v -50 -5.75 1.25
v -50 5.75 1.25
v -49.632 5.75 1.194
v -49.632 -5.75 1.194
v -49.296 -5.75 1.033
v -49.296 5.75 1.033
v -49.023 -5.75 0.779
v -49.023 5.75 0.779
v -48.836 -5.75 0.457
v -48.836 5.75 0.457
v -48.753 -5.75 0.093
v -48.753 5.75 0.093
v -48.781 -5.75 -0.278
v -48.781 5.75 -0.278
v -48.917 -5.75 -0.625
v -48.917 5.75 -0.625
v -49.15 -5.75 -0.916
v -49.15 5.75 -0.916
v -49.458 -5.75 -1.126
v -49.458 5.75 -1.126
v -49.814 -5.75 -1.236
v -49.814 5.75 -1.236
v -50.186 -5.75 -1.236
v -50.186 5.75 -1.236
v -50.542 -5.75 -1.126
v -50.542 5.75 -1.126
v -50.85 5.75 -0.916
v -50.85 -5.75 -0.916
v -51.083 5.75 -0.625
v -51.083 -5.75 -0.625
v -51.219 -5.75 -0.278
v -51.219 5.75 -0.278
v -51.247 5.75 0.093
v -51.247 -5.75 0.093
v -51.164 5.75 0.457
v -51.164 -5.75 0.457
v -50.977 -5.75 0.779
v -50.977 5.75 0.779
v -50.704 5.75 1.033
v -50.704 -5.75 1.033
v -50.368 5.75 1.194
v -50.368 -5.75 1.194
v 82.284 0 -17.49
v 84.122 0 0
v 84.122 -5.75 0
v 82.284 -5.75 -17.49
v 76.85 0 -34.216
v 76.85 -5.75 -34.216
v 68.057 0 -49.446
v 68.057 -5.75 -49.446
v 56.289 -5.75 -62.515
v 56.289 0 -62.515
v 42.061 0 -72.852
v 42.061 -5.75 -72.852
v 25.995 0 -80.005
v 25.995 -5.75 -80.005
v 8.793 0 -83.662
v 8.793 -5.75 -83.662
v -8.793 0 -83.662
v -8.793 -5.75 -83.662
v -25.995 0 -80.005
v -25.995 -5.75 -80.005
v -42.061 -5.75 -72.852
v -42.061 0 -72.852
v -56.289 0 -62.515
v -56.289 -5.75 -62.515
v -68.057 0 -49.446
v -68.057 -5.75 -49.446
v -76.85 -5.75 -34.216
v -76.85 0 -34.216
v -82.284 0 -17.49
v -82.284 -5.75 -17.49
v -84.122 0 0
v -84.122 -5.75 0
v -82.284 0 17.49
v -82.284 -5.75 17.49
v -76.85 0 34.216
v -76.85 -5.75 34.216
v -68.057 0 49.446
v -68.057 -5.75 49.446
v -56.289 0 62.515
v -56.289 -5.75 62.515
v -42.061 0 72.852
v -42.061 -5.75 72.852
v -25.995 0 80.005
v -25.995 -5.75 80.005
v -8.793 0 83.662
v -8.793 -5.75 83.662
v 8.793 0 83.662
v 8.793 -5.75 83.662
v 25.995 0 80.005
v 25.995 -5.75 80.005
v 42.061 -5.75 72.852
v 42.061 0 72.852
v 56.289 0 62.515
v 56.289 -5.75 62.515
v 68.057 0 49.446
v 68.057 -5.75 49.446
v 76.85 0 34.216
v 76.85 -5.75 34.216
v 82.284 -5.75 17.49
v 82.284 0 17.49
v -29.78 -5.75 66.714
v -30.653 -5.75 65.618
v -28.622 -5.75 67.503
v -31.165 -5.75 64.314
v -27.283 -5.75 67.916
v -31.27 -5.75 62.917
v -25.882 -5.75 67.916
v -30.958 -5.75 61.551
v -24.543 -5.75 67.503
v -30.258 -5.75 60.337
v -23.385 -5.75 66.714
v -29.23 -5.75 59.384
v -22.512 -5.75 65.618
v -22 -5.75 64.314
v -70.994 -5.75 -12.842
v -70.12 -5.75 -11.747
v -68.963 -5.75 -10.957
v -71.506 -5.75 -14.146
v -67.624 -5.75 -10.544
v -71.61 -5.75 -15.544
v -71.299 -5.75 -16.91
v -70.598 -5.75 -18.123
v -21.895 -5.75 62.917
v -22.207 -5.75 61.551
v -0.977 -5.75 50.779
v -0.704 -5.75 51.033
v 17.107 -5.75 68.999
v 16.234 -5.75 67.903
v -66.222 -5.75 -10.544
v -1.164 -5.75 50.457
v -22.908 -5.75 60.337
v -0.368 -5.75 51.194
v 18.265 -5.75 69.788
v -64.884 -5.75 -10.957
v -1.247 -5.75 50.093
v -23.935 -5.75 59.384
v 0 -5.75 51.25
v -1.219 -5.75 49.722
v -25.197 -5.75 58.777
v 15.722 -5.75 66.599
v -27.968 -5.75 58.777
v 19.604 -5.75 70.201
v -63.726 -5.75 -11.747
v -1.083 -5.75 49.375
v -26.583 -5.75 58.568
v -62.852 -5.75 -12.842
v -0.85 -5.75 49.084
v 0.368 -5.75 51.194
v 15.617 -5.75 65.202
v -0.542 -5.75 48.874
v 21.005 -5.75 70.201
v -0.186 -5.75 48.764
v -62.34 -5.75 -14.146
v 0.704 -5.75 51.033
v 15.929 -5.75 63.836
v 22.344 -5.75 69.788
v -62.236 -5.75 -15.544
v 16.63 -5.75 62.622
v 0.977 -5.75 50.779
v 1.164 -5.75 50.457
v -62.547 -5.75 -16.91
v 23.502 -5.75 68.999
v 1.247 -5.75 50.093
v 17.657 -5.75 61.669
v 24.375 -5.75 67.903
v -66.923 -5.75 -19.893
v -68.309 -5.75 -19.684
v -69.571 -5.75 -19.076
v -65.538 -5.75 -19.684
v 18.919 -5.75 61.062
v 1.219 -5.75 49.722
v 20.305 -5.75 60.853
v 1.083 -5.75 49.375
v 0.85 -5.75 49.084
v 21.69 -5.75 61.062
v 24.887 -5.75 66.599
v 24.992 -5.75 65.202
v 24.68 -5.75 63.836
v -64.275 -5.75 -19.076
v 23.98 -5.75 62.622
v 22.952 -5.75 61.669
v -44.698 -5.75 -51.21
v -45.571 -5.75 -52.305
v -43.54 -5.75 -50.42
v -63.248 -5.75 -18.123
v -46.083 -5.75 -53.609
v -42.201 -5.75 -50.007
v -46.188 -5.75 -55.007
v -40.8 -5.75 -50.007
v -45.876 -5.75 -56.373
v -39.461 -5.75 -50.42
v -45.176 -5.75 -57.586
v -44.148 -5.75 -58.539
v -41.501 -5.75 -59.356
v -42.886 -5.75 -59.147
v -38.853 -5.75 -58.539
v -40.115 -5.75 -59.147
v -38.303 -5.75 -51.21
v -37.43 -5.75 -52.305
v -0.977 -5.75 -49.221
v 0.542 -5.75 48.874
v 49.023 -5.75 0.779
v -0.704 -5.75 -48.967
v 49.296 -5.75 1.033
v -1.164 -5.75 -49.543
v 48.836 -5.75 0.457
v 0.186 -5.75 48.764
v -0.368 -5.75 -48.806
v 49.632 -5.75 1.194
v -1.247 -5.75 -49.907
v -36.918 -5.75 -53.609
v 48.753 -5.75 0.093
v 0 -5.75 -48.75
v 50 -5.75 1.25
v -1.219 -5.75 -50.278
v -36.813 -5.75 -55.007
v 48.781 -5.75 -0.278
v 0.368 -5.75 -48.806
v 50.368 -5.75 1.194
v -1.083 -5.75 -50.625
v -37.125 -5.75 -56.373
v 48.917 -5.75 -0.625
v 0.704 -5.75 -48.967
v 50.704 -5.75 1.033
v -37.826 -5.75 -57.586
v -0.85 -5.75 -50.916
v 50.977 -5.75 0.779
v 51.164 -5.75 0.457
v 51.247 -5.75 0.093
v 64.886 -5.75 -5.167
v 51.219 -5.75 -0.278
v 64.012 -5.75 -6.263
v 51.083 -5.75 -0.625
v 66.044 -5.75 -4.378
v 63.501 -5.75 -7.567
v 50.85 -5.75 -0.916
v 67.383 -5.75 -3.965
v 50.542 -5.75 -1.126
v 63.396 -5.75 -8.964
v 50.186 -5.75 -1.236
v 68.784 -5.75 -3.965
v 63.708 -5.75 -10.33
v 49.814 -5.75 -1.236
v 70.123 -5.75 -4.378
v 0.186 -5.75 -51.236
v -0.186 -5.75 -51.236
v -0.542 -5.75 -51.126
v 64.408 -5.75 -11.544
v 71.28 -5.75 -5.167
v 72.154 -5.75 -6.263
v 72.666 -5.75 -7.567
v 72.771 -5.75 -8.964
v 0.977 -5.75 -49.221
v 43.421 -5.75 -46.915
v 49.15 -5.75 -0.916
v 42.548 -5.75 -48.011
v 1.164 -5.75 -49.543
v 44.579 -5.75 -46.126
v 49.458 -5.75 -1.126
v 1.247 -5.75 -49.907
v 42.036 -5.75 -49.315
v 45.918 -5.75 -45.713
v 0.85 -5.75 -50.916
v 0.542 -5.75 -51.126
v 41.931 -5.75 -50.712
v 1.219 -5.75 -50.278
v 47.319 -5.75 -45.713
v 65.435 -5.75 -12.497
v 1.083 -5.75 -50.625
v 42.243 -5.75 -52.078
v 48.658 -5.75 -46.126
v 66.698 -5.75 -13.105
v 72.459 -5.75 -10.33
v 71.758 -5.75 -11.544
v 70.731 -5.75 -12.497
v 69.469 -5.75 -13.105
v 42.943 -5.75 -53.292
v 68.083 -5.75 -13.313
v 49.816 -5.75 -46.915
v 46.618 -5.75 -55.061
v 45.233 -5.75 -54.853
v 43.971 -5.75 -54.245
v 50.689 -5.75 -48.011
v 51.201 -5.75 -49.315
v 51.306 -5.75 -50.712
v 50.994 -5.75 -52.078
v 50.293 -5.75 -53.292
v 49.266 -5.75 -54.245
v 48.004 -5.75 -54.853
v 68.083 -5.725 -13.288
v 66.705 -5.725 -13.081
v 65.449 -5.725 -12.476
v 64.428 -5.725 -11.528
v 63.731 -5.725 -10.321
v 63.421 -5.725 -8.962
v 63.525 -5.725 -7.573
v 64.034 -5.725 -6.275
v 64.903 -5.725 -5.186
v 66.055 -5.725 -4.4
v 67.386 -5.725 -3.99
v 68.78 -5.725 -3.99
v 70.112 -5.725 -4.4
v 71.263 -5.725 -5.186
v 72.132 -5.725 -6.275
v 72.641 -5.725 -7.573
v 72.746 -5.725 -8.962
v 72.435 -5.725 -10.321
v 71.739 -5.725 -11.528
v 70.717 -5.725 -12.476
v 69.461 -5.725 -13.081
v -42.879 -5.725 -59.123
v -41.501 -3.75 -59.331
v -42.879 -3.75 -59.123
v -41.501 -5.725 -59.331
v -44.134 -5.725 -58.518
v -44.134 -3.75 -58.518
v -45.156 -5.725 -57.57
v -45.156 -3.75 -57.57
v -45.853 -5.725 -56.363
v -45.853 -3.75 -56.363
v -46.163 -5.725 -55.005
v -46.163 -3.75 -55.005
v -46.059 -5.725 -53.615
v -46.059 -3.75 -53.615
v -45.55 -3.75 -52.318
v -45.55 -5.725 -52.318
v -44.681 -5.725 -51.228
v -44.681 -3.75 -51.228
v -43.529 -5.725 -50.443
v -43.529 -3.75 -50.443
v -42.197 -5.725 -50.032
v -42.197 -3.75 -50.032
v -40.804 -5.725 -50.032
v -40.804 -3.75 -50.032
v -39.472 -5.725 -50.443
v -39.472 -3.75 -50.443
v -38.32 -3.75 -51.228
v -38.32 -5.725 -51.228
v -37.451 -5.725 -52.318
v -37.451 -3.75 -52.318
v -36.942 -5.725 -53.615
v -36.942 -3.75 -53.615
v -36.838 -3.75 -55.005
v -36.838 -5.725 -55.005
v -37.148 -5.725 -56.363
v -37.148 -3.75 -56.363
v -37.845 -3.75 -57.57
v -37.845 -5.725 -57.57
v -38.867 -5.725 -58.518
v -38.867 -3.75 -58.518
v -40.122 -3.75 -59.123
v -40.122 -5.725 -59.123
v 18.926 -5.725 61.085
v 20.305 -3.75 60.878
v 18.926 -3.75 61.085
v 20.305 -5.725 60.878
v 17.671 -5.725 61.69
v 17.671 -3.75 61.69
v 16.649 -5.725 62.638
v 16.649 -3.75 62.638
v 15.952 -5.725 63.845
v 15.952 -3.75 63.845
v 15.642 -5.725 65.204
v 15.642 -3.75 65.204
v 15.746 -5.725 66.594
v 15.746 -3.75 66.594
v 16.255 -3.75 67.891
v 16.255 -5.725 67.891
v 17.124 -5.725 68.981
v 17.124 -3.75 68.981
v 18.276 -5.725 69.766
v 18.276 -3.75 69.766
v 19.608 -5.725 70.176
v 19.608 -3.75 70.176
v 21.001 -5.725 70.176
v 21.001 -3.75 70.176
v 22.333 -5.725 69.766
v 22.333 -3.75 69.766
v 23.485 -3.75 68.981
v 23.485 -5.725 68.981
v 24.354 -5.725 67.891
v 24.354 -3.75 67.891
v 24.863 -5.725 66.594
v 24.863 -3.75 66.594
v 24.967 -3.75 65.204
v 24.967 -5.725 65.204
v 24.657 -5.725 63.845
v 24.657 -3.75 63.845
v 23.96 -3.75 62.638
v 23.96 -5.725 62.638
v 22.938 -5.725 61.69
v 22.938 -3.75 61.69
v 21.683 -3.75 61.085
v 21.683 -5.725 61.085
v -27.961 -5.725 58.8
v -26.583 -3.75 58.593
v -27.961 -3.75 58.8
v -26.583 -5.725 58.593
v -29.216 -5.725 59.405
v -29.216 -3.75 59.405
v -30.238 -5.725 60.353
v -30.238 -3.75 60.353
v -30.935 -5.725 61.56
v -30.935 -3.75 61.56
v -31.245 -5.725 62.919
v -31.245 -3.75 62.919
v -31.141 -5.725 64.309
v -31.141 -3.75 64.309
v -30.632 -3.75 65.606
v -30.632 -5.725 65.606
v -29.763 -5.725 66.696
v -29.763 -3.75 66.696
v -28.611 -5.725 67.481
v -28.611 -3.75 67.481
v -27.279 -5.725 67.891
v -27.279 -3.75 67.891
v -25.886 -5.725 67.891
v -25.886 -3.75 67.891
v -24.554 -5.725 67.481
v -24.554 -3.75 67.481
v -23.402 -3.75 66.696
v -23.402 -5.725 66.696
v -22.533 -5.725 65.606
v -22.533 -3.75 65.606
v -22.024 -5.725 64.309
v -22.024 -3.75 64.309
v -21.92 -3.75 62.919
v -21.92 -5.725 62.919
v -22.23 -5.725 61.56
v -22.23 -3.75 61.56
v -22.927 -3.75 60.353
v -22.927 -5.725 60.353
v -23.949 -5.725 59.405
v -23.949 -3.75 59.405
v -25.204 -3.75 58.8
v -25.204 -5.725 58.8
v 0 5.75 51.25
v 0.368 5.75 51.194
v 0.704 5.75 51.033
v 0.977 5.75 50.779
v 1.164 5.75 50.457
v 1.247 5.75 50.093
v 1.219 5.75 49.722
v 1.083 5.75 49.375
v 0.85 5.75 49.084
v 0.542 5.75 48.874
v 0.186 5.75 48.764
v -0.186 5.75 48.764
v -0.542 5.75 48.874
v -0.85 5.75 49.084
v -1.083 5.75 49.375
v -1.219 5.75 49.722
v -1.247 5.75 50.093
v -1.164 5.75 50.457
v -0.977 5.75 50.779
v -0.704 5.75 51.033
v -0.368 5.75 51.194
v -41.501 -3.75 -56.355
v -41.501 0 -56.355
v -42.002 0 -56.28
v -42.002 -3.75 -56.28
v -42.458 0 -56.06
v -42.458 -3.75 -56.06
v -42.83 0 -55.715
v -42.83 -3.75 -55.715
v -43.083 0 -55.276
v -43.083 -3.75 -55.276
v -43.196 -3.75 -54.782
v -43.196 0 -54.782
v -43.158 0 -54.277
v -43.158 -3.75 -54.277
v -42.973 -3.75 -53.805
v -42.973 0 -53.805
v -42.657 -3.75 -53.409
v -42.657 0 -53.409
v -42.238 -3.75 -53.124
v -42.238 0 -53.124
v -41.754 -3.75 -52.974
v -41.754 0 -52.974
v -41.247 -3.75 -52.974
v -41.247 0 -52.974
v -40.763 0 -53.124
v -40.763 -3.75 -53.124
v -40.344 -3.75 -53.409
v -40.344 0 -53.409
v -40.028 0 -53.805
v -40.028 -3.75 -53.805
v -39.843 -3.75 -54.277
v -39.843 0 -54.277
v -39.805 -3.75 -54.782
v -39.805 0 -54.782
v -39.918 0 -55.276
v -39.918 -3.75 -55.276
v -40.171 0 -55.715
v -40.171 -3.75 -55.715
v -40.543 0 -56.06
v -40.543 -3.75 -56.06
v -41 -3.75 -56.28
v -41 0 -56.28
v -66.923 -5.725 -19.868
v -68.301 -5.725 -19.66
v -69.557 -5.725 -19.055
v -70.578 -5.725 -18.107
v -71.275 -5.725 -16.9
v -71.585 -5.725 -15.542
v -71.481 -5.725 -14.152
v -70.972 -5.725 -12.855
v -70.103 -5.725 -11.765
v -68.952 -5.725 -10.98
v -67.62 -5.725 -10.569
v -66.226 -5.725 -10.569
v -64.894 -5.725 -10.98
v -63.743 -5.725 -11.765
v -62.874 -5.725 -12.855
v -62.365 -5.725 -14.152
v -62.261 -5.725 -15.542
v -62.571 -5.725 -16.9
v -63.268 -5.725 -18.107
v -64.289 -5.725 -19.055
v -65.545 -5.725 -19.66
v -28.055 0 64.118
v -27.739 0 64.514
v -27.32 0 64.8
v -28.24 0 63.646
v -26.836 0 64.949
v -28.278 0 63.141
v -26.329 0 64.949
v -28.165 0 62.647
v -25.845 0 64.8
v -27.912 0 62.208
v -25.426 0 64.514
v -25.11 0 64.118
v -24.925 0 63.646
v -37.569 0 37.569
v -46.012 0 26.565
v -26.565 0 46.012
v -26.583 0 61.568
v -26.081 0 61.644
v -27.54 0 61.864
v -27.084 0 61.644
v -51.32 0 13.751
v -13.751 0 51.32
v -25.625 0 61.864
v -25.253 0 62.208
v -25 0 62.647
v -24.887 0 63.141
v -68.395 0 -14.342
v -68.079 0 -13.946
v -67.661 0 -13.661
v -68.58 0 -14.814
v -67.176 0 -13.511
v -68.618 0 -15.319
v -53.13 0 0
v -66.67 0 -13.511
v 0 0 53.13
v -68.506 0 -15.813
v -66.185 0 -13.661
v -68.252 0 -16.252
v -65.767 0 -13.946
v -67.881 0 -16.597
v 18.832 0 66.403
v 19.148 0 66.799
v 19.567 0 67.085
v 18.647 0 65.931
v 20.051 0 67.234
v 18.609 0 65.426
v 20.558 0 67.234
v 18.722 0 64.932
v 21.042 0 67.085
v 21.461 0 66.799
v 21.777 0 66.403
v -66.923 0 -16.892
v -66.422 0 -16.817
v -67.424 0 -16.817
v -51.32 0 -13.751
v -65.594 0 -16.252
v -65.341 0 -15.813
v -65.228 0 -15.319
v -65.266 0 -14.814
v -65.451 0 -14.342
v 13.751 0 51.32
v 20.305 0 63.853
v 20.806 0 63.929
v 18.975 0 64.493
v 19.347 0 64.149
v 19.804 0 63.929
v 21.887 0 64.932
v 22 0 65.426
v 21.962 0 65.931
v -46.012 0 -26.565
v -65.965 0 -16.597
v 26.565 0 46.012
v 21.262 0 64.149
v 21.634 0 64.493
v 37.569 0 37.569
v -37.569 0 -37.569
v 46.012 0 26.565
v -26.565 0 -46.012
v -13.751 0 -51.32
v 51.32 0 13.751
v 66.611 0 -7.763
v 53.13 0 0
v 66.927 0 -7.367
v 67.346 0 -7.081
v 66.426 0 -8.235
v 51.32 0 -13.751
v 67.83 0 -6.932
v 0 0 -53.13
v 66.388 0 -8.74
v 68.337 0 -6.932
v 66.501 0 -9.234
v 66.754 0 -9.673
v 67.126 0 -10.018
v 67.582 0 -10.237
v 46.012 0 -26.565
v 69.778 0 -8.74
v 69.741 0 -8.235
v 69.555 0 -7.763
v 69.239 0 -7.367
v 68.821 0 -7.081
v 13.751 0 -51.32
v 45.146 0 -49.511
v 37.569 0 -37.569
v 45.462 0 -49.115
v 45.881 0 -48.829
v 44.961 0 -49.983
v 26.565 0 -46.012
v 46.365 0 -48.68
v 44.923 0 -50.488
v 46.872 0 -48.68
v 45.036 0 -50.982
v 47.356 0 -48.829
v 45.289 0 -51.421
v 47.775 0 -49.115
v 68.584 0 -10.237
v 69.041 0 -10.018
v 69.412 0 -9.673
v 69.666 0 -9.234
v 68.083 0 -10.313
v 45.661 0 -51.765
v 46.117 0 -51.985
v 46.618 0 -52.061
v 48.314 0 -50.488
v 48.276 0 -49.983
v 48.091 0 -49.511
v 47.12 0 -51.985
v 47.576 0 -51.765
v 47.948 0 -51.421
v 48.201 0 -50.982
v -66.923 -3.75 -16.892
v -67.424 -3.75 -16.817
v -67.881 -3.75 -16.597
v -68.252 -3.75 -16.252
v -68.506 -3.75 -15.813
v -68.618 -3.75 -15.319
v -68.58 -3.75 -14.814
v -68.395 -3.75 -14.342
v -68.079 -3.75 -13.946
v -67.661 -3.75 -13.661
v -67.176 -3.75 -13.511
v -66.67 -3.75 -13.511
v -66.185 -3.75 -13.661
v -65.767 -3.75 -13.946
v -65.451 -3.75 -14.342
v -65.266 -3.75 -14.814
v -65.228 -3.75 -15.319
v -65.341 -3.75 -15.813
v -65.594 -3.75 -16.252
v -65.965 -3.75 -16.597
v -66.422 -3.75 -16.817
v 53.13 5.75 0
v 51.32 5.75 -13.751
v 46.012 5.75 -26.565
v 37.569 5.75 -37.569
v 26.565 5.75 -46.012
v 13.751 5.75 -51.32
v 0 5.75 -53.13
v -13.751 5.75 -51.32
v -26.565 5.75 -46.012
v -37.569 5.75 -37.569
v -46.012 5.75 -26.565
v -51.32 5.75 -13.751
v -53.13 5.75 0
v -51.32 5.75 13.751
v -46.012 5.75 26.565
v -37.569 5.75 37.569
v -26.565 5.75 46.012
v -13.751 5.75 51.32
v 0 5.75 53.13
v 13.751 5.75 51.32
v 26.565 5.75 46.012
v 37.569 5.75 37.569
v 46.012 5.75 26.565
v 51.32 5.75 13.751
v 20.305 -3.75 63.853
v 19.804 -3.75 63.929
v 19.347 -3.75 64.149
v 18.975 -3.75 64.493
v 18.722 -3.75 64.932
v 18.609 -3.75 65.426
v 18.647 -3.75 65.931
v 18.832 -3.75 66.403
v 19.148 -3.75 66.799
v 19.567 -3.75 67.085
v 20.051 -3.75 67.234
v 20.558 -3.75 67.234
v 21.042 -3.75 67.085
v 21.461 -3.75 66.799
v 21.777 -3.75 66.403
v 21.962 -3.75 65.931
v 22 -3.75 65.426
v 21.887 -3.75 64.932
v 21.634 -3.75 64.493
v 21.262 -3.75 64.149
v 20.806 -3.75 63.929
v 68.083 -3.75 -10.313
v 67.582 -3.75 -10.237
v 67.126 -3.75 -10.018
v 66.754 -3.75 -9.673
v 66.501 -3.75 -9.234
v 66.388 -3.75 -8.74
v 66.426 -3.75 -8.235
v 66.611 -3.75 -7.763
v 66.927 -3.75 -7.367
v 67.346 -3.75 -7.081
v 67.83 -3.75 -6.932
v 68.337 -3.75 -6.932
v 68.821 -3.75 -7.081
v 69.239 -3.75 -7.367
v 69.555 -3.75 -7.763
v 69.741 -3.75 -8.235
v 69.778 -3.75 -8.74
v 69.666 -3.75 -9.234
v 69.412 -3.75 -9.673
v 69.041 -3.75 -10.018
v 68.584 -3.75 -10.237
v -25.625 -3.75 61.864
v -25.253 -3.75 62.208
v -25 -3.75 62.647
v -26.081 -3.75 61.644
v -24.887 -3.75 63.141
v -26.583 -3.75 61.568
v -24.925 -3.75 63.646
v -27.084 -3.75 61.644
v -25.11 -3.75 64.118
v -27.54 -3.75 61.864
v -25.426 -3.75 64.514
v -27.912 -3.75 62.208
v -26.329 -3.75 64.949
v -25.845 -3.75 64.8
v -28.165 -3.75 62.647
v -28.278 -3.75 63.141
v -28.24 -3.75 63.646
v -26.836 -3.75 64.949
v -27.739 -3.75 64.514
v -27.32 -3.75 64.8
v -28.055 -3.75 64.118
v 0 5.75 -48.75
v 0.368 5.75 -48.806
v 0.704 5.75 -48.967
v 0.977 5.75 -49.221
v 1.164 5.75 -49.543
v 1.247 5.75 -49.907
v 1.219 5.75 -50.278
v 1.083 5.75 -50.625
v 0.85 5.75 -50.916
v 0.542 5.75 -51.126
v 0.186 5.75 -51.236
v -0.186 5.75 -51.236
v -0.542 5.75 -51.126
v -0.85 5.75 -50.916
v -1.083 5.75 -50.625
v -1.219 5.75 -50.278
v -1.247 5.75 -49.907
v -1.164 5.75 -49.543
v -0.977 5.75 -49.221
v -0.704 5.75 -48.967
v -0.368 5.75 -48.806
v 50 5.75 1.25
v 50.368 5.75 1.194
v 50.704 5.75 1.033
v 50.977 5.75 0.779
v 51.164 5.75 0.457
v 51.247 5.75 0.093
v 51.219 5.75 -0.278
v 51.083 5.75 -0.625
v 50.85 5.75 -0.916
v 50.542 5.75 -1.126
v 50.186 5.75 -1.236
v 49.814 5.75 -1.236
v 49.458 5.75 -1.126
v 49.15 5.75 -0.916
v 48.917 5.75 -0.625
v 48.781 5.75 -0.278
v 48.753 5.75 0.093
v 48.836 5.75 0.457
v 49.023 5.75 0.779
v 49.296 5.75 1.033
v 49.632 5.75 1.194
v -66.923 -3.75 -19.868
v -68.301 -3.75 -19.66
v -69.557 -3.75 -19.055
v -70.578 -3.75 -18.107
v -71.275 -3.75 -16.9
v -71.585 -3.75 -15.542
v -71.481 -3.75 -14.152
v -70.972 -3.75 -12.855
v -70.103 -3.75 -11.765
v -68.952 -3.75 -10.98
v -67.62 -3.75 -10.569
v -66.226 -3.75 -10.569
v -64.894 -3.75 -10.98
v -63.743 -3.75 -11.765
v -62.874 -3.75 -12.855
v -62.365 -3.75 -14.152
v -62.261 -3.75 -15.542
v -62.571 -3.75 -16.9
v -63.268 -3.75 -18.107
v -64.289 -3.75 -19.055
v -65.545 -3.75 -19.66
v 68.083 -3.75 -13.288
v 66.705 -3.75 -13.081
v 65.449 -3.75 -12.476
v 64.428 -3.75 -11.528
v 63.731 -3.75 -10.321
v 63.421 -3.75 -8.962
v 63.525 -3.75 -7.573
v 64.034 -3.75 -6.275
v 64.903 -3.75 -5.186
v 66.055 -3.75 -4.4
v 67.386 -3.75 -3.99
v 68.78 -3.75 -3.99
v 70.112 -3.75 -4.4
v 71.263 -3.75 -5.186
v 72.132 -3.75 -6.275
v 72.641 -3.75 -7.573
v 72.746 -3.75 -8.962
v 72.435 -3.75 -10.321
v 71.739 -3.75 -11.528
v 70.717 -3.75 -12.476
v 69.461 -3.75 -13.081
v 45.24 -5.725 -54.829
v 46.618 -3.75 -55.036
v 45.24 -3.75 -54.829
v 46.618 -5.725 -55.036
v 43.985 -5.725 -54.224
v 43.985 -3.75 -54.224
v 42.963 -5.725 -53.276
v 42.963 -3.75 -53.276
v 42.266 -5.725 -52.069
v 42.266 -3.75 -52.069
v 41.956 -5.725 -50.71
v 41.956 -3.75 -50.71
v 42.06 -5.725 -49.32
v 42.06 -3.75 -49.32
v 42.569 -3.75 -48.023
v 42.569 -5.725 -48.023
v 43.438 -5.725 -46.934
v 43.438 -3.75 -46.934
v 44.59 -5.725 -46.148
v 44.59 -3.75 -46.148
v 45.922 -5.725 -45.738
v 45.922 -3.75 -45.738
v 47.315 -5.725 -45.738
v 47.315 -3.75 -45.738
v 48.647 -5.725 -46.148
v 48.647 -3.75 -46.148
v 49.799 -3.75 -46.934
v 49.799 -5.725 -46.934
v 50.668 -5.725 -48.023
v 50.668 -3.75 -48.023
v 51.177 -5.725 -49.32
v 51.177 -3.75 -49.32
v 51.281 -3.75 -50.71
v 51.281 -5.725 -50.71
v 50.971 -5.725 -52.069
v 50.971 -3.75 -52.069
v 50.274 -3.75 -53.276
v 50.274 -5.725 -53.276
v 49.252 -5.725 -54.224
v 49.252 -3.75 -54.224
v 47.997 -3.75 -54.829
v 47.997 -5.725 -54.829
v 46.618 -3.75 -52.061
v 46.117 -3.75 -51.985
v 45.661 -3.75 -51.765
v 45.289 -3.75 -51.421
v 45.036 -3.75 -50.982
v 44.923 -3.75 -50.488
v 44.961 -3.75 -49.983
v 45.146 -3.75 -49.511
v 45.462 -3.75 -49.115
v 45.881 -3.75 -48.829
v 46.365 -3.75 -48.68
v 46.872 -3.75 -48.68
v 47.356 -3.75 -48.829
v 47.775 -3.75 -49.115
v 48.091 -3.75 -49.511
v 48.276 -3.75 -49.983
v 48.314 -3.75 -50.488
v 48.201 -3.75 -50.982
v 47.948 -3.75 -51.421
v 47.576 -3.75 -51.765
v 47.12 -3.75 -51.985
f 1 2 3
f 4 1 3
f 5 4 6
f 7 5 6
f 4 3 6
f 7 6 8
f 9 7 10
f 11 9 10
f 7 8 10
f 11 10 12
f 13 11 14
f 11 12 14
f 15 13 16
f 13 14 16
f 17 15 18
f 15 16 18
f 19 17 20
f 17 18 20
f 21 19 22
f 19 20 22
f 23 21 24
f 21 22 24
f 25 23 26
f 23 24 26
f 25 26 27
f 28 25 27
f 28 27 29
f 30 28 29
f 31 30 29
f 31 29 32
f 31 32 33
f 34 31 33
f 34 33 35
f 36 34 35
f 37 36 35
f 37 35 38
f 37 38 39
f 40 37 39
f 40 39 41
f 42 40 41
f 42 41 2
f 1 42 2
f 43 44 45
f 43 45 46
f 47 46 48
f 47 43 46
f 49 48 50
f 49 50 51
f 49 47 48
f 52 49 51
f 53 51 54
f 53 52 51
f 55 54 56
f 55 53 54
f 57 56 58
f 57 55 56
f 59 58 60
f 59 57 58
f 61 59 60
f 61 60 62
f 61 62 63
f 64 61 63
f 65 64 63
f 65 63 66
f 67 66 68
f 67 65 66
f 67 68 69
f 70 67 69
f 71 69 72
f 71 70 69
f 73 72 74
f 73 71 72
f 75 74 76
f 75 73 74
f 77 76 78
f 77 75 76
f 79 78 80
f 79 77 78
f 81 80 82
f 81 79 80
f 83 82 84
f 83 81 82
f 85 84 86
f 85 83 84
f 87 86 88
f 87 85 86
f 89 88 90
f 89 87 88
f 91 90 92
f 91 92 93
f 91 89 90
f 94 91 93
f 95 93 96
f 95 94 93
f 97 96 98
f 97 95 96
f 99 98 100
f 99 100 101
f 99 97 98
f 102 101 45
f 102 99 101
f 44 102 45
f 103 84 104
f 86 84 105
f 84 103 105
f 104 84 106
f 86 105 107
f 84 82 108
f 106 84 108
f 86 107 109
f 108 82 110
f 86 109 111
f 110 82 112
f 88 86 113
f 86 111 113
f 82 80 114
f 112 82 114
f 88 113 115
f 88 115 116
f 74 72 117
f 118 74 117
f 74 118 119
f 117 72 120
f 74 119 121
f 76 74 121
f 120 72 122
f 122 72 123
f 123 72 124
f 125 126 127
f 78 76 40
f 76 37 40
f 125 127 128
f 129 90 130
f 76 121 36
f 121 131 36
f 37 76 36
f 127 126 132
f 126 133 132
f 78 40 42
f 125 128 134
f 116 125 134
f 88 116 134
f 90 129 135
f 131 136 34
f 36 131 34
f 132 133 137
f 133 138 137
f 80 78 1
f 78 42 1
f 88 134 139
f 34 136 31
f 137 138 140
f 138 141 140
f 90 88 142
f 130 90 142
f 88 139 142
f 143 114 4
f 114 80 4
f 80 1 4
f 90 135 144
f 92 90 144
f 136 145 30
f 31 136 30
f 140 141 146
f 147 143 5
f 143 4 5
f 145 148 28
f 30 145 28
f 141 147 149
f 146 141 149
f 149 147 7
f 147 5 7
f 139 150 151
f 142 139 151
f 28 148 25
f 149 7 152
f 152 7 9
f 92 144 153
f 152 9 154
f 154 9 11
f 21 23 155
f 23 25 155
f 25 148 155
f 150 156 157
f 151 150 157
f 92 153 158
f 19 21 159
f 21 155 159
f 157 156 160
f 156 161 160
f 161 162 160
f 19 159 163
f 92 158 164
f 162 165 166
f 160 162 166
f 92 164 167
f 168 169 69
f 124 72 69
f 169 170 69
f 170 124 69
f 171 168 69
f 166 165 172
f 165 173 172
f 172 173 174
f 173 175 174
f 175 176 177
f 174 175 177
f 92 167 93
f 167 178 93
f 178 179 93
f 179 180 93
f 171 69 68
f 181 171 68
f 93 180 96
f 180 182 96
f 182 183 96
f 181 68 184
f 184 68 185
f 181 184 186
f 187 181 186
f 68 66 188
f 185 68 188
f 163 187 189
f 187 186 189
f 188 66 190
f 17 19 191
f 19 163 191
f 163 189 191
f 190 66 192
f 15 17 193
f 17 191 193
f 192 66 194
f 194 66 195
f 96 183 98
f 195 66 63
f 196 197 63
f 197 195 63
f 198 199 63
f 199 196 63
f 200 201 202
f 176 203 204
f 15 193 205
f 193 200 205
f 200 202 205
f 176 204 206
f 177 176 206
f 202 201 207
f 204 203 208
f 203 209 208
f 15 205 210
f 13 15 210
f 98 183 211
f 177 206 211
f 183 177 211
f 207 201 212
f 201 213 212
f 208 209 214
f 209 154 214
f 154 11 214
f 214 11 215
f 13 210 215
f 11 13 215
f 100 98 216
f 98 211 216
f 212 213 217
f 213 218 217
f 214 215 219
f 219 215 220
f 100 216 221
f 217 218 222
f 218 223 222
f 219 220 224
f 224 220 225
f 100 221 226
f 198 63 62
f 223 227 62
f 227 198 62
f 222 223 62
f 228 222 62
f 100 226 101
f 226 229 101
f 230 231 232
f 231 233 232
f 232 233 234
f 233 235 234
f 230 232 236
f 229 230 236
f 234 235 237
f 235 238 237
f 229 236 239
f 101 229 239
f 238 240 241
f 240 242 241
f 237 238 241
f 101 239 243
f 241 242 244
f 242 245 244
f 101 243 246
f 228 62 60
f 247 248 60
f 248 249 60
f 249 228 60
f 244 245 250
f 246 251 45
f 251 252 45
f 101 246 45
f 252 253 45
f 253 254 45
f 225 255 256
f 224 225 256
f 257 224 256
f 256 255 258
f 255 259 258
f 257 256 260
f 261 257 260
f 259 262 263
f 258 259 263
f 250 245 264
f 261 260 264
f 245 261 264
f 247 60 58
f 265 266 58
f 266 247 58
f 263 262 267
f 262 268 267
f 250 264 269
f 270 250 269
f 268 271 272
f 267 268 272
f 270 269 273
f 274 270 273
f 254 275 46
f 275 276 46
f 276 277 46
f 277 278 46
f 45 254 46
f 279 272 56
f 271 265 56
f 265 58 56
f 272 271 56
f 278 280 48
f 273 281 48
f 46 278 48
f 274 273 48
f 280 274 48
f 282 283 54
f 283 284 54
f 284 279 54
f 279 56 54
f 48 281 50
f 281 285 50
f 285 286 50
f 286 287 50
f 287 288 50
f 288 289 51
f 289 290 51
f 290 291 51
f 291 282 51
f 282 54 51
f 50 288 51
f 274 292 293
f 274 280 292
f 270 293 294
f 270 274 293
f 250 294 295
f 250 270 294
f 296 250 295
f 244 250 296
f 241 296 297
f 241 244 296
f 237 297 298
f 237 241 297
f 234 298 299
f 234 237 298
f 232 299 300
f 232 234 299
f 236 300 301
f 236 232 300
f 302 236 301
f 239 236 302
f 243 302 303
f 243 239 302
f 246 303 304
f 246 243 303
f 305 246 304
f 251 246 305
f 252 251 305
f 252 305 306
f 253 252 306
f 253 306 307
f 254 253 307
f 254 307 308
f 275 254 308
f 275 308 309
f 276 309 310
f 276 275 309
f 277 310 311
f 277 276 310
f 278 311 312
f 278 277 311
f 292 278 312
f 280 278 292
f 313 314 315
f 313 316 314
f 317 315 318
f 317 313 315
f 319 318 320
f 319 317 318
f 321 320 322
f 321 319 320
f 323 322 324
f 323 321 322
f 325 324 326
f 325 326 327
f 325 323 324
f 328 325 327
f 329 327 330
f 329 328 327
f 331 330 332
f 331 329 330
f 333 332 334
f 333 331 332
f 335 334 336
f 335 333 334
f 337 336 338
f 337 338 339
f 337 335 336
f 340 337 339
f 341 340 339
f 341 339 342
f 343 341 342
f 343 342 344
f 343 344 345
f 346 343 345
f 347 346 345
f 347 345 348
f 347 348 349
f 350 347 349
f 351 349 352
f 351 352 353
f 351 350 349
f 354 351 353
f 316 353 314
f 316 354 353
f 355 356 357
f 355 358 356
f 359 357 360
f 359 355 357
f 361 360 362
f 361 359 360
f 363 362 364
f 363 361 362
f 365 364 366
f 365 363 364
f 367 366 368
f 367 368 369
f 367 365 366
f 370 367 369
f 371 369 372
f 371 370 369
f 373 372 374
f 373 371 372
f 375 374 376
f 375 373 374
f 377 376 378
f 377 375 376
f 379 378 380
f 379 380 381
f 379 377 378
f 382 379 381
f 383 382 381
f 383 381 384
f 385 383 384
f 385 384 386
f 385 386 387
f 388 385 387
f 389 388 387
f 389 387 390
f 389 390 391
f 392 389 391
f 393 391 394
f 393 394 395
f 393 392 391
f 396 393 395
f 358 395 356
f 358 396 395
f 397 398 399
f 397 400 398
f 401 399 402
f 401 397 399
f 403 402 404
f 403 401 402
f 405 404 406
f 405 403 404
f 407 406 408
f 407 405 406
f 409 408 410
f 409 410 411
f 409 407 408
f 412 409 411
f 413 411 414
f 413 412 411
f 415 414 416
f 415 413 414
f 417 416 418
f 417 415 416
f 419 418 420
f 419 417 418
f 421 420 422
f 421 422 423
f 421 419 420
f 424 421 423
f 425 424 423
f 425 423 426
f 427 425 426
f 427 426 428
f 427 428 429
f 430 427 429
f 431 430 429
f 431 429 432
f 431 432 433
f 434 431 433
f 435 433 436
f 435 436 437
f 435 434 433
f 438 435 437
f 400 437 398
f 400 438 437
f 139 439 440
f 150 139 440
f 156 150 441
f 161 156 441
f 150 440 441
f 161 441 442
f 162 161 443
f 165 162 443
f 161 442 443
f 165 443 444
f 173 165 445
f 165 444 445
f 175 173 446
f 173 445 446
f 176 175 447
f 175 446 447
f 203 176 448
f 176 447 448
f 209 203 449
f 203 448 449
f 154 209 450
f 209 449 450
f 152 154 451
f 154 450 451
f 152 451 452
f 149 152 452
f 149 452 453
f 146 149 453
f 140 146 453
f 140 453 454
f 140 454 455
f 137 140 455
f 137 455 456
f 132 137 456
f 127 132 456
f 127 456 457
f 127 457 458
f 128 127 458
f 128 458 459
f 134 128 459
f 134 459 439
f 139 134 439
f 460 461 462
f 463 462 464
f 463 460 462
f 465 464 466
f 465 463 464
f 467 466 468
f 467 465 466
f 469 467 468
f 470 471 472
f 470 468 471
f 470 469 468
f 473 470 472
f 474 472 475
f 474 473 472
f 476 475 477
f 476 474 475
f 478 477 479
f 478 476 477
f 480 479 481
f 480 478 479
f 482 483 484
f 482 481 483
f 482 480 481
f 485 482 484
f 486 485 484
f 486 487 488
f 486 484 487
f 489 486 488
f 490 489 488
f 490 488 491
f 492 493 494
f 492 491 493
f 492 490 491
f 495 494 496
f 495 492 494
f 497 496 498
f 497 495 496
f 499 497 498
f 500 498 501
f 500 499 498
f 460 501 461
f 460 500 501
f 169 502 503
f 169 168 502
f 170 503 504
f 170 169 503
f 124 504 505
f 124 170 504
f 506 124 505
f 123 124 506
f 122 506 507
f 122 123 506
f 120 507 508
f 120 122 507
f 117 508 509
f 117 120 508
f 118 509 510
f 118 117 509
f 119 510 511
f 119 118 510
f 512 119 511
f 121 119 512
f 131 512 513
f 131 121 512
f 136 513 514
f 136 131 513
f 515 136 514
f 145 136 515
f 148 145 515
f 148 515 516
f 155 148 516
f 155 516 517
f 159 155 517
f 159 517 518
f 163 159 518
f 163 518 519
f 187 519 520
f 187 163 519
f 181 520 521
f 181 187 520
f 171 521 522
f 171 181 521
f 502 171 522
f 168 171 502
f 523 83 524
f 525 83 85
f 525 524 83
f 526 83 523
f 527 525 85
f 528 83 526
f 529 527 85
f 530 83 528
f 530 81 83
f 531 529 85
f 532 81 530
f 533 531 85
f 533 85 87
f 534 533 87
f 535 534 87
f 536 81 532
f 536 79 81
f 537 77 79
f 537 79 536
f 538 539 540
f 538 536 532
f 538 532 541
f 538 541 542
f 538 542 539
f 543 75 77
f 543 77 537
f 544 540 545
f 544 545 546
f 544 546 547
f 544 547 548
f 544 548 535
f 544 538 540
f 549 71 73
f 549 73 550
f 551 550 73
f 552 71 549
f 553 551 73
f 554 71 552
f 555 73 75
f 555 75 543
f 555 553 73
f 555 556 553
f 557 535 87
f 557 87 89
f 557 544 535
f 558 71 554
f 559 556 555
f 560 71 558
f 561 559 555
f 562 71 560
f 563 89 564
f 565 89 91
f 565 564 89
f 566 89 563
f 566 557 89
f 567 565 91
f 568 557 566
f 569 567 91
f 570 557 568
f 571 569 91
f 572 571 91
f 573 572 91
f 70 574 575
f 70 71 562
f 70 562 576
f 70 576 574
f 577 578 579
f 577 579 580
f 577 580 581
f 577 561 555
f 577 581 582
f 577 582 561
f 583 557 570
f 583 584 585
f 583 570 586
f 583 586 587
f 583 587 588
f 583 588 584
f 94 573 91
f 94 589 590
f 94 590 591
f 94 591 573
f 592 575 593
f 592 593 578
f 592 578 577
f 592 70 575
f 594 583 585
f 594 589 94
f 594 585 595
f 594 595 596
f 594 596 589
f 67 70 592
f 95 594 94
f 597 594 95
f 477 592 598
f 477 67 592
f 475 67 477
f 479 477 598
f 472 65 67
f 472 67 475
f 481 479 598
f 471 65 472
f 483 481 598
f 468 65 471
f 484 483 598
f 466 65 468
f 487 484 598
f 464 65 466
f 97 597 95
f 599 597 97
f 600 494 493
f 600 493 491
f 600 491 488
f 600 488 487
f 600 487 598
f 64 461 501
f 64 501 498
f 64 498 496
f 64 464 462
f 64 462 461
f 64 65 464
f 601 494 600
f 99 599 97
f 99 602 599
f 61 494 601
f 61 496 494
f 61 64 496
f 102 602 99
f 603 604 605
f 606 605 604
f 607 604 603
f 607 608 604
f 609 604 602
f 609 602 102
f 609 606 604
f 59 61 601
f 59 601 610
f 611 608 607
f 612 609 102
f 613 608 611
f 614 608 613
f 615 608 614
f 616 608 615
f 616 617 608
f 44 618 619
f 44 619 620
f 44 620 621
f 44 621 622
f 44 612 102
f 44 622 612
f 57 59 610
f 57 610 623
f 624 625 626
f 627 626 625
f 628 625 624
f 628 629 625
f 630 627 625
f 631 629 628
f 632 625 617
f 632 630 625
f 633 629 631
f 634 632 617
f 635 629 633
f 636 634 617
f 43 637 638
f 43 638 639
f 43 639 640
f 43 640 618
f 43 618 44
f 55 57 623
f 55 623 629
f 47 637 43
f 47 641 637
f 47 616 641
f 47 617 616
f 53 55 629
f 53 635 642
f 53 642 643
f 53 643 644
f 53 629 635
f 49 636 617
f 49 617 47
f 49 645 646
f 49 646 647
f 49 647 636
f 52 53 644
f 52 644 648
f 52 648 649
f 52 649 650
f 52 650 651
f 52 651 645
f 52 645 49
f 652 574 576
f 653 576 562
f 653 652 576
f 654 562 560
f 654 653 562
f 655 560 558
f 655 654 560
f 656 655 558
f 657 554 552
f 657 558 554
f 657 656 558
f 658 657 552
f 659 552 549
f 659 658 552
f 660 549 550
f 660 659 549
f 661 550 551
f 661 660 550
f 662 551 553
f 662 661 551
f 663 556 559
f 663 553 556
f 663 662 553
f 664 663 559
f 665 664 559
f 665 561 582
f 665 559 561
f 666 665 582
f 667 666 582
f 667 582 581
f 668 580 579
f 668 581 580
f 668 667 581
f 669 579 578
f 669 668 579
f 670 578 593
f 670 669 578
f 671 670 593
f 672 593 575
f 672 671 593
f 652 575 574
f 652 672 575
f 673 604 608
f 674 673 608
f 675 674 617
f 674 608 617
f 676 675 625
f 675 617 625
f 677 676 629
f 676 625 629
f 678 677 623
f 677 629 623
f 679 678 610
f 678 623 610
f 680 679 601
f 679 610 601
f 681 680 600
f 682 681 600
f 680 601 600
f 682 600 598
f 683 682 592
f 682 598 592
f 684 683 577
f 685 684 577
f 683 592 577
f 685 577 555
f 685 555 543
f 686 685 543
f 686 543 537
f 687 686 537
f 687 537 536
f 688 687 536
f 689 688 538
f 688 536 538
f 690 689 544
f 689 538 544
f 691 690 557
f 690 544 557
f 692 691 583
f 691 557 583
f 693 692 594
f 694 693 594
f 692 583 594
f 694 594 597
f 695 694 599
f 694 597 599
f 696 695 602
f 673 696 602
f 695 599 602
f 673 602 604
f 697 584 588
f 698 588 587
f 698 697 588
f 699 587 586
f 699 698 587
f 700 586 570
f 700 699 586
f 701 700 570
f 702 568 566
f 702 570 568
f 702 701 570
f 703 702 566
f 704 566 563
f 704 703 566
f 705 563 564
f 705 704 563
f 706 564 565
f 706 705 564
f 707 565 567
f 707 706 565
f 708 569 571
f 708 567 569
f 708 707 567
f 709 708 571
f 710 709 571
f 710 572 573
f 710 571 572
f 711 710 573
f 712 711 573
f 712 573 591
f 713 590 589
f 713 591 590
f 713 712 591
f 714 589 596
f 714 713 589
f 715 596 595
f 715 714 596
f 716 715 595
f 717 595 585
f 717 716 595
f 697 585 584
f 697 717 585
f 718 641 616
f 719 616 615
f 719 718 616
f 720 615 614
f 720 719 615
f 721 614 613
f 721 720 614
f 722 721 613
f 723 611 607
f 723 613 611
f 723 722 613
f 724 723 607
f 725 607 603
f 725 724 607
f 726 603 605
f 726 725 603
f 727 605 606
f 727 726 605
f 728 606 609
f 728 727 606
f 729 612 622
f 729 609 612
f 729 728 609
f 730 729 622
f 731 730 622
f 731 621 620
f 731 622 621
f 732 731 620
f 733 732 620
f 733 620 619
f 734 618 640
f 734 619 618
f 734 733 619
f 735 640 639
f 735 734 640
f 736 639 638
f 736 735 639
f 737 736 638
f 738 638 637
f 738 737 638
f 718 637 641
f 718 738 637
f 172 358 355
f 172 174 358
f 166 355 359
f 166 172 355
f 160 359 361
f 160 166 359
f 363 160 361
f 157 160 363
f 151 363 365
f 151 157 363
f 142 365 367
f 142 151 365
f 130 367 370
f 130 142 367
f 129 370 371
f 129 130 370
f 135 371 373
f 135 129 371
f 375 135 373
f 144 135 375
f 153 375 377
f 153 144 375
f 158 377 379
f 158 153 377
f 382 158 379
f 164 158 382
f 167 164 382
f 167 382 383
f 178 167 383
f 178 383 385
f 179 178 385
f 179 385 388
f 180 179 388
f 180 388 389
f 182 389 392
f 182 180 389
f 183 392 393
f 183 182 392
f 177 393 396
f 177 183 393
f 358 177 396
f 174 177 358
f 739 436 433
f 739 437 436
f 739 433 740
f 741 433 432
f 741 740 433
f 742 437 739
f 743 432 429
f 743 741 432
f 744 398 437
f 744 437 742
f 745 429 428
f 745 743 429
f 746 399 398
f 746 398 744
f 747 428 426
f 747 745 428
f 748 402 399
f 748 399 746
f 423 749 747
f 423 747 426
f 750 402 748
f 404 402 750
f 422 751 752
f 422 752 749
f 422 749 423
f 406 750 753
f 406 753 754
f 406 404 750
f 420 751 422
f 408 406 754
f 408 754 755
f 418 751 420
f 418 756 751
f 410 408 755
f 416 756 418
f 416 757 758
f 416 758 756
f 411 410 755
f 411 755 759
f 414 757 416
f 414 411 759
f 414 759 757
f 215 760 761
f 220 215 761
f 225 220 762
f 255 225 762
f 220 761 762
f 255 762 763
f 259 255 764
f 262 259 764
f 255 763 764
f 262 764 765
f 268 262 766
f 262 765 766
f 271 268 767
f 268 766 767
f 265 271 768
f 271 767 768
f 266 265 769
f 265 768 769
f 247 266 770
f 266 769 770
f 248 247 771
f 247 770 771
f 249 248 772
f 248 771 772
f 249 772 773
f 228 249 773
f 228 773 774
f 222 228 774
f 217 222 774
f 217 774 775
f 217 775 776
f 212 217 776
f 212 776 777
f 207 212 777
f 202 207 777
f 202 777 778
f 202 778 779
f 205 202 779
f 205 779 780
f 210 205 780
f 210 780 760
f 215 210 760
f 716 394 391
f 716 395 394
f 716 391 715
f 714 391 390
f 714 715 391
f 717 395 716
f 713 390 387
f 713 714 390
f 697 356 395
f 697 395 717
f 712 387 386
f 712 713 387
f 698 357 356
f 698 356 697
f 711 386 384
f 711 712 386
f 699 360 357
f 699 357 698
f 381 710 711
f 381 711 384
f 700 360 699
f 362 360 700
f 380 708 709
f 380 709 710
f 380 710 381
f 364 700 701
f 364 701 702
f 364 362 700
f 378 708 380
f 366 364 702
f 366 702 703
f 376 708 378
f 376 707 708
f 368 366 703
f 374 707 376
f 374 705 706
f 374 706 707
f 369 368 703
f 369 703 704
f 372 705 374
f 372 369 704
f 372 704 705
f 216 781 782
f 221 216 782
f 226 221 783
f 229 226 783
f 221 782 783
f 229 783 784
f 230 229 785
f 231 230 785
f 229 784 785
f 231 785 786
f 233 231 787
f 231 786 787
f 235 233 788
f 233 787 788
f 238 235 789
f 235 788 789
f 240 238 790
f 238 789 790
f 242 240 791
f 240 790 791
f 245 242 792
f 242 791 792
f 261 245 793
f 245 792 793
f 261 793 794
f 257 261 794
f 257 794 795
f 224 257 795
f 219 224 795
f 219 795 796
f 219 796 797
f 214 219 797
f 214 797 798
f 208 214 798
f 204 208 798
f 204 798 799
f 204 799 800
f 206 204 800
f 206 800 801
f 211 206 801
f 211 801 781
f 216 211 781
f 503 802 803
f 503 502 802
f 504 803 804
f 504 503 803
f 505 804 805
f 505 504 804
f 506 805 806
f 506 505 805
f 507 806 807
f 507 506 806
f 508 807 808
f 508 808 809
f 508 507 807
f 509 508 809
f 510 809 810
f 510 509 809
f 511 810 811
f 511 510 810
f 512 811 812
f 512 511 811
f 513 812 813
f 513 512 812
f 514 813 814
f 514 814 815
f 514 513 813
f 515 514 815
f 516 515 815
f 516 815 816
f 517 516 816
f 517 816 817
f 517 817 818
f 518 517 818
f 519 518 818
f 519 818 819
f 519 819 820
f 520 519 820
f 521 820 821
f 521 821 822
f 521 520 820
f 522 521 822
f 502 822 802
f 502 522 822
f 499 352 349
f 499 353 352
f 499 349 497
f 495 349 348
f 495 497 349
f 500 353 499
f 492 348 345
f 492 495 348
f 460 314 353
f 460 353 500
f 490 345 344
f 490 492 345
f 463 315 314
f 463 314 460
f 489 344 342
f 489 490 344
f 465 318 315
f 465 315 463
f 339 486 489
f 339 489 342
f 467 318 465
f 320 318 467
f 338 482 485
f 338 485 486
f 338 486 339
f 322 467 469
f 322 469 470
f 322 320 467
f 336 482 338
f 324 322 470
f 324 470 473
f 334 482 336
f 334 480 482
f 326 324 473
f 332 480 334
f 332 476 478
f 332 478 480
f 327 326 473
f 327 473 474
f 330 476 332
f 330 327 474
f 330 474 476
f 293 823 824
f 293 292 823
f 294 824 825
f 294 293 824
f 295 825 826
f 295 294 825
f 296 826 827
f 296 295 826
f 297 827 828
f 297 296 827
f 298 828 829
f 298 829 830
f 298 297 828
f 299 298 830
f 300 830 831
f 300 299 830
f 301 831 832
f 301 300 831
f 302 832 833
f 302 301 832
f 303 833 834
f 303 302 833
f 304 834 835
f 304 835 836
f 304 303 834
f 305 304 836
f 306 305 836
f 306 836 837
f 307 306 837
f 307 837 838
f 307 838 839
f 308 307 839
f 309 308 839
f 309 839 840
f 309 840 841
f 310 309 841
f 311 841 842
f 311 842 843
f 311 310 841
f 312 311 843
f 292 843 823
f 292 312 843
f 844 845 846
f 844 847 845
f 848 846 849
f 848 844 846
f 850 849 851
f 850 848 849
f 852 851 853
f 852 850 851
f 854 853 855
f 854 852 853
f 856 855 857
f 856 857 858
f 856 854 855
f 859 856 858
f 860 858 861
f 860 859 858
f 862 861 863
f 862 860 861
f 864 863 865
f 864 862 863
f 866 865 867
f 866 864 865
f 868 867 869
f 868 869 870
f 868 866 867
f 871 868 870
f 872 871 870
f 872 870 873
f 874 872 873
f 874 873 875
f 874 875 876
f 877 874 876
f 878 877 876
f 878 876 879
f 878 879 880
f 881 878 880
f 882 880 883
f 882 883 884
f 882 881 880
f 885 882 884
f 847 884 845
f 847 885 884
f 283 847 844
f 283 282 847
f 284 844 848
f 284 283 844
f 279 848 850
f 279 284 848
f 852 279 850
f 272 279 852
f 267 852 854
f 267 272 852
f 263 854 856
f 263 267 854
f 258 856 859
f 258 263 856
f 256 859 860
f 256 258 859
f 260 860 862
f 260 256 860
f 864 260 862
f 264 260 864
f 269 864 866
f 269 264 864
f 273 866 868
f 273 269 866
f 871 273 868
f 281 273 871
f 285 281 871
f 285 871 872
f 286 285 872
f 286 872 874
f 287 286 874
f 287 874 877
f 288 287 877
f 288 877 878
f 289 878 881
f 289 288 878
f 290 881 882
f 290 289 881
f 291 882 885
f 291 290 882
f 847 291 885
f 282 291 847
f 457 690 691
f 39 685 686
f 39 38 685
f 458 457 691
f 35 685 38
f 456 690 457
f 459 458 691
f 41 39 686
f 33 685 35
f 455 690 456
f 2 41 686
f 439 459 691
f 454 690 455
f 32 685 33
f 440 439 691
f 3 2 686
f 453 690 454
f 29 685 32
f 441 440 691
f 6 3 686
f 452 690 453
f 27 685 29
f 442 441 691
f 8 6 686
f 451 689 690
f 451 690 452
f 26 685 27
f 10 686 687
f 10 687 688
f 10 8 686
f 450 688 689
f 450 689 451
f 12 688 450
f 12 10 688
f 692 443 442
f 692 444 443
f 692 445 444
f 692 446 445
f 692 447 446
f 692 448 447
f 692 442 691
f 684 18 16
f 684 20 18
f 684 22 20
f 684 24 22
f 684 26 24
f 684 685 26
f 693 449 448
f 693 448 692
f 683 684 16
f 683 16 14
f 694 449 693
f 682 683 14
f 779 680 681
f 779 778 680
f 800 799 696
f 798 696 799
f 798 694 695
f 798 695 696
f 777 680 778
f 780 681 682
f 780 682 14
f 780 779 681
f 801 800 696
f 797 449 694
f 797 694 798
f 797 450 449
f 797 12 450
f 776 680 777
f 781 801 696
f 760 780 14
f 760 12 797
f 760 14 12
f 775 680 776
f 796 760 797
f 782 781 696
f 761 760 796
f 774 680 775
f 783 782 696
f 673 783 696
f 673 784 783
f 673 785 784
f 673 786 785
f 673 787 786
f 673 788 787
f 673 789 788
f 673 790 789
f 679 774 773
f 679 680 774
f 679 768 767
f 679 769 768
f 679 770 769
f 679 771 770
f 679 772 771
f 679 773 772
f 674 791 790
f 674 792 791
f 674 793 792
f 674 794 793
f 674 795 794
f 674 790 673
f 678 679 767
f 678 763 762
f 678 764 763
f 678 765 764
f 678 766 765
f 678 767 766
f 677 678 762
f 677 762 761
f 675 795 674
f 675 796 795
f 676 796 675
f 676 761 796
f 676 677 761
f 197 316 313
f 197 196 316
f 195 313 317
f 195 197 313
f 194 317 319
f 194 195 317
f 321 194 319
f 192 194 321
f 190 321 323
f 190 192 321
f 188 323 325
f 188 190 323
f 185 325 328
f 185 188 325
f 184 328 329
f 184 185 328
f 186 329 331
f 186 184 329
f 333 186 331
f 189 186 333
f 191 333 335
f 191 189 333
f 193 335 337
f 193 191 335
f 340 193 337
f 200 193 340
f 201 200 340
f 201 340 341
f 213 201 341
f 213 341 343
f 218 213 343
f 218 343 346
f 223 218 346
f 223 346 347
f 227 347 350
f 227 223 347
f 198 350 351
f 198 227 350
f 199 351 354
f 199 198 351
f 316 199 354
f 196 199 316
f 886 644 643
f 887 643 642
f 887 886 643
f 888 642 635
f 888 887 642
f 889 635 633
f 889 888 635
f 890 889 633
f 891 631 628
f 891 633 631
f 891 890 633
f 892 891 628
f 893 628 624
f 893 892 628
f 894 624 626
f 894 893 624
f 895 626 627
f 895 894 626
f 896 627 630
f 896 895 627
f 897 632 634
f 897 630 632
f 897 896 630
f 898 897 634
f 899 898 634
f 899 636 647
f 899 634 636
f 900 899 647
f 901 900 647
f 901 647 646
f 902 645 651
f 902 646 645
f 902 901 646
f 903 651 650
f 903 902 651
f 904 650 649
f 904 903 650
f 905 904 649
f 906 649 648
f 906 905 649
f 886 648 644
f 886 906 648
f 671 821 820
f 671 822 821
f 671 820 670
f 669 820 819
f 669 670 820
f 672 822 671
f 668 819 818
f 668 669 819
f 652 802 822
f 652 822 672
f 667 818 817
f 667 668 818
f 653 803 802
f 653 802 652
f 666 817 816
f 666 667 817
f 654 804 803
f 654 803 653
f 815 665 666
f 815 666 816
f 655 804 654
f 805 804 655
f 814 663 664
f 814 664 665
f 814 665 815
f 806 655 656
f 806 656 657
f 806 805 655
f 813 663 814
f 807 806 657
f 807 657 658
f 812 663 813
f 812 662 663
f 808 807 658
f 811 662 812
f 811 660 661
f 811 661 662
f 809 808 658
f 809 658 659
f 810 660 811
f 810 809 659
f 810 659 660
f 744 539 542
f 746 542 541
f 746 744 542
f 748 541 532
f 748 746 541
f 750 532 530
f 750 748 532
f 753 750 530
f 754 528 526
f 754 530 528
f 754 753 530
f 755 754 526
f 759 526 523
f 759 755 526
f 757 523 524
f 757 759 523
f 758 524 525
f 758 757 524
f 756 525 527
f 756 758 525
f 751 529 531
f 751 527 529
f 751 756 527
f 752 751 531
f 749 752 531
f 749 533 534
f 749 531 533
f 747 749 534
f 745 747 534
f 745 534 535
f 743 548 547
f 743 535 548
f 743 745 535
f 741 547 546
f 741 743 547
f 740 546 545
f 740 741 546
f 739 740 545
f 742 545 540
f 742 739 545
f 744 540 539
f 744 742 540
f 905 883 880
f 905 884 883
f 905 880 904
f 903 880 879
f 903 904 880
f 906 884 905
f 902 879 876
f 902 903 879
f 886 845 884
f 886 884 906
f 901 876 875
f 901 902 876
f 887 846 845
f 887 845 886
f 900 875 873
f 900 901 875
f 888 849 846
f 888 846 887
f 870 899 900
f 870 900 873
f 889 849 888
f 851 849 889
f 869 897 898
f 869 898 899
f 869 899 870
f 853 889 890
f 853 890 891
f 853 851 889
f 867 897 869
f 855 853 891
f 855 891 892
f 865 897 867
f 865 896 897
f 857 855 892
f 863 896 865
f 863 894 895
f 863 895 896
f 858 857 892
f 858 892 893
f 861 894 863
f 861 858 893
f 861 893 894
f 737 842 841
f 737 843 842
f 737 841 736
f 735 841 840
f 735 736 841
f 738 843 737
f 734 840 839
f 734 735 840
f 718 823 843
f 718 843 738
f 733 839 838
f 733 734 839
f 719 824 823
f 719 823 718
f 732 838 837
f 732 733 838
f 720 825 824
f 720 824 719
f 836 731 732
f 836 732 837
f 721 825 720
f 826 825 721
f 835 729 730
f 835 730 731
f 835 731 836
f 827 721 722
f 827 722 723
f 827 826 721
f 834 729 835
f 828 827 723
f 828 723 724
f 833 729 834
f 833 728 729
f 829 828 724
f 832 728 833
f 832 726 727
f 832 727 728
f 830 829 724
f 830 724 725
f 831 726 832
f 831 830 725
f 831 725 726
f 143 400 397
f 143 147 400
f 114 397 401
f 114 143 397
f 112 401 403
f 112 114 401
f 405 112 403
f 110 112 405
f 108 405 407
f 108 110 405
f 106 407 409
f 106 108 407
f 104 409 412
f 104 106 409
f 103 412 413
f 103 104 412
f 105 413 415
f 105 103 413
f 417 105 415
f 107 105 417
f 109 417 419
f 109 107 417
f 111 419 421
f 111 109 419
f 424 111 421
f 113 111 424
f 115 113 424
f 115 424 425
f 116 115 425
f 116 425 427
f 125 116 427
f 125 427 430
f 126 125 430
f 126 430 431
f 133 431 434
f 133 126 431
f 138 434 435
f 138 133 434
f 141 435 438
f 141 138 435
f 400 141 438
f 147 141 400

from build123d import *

# Parameters (mm, degrees)
ESQUISSE1_R                                = 84.1225
BOSS_EXTRU_1_DEPTH                         = 5.75
ESQUISSE2_R                                = 53.13
BOSS_EXTRU_2_DEPTH                         = 5.75
TROU_TARAUD_M31_D                          = 2.5
TROU_TARAUD_M31_DEPTH                      = 12.5
TROU_TARAUD_M31_TIP                        = 0.751075774
CHAMBRAGE_POUR_VIS_T_TE_HEXAGONALE_2_COUNT = 2
CHAMBRAGE_POUR_VIS_T_TE_HEXAGONALE_2_PITCH = 46.9428037
CHAMBRAGE_POUR_VIS_T_TE_HEXAGONALE_3_COUNT = 2
CHAMBRAGE_POUR_VIS_T_TE_HEXAGONALE_3_PITCH = 118.863351538
CHAMBRAGE_POUR_VIS_T_TE_HEXAGONALE_4_COUNT = 2
CHAMBRAGE_POUR_VIS_T_TE_HEXAGONALE_4_PITCH = 135.166416173
CHAMBRAGE_POUR_VIS_T_TE_HEXAGONALE_5_COUNT = 2
CHAMBRAGE_POUR_VIS_T_TE_HEXAGONALE_5_PITCH = 118.863351538
CHAMBRAGE_POUR_VIS_T_TE_HEXAGONALE_6_COUNT = 2
CHAMBRAGE_POUR_VIS_T_TE_HEXAGONALE_6_PITCH = 88.223612472


with BuildPart() as part:
    # Esquisse1 → Boss.-Extru.1 (new body)
    with BuildSketch(Plane(origin=(0, 0, 0), x_dir=(1, 0, 0), z_dir=(0, 1, 0))):
        Circle(ESQUISSE1_R)
    extrude(amount=-BOSS_EXTRU_1_DEPTH)

    # Esquisse2 → Boss.-Extru.2 (add)
    with BuildSketch(Plane(origin=(0, 0, 0), x_dir=(1, 0, 0), z_dir=(0, 1, 0))):
        Circle(ESQUISSE2_R)
    extrude(amount=BOSS_EXTRU_2_DEPTH)

    # Trou taraudé M31
    with Locations(Plane(origin=(0, -5.75, -50), x_dir=(0, 0, -1), z_dir=(0, -1, 0))):
        with Locations((0, 0), (-50, -50), (-100, 0), (-50, 50)):
            Hole(TROU_TARAUD_M31_D / 2, depth=TROU_TARAUD_M31_DEPTH)
            with Locations((0, 0, -(TROU_TARAUD_M31_DEPTH + TROU_TARAUD_M31_TIP / 2))):  # 118° drill point
                Cone(0, TROU_TARAUD_M31_D / 2, TROU_TARAUD_M31_TIP, mode=Mode.SUBTRACT)

    # Esquisse7 → Chambrage pour vis à tête hexagonale M31 (revolve, cut)
    with BuildSketch(Plane(origin=(-26.582568127, -5.75, 63.268205691), x_dir=(0, 0, -1), z_dir=(1, 0, 0))):
        Polygon((0, 0), (0, 11.5), (1.7, 11.5), (1.7, 2), (4.6755, 2), (4.6755, 0.025), (4.7005, 0), align=None)
    chambrage_pour_vis_t_te_hexagonale_m31 = revolve(axis=Axis((-26.582568127, -12.1, 63.268205691), (0, 1, 0)), mode=Mode.SUBTRACT)

    # Chambrage pour vis _ t_te hexagonale 2: Chambrage pour vis à tête hexagonale M31 ×2
    with Locations(*[Vector(0.998814611, 0, 0.048676196) * (i * CHAMBRAGE_POUR_VIS_T_TE_HEXAGONALE_2_PITCH) for i in range(1, CHAMBRAGE_POUR_VIS_T_TE_HEXAGONALE_2_COUNT)]):
        add(chambrage_pour_vis_t_te_hexagonale_m31, mode=Mode.SUBTRACT)

    # Chambrage pour vis _ t_te hexagonale 3: Chambrage pour vis à tête hexagonale M31 ×2
    with Locations(*[Vector(0.796424839, 0, -0.604737527) * (i * CHAMBRAGE_POUR_VIS_T_TE_HEXAGONALE_3_PITCH) for i in range(1, CHAMBRAGE_POUR_VIS_T_TE_HEXAGONALE_3_COUNT)]):
        add(chambrage_pour_vis_t_te_hexagonale_m31, mode=Mode.SUBTRACT)

    # Chambrage pour vis _ t_te hexagonale 4: Chambrage pour vis à tête hexagonale M31 ×2
    with Locations(*[Vector(0.541562128, 0, -0.840660729) * (i * CHAMBRAGE_POUR_VIS_T_TE_HEXAGONALE_4_PITCH) for i in range(1, CHAMBRAGE_POUR_VIS_T_TE_HEXAGONALE_4_COUNT)]):
        add(chambrage_pour_vis_t_te_hexagonale_m31, mode=Mode.SUBTRACT)

    # Chambrage pour vis _ t_te hexagonale 5: Chambrage pour vis à tête hexagonale M31 ×2
    with Locations(*[Vector(-0.125505642, 0, -0.992092906) * (i * CHAMBRAGE_POUR_VIS_T_TE_HEXAGONALE_5_PITCH) for i in range(1, CHAMBRAGE_POUR_VIS_T_TE_HEXAGONALE_5_COUNT)]):
        add(chambrage_pour_vis_t_te_hexagonale_m31, mode=Mode.SUBTRACT)

    # Chambrage pour vis _ t_te hexagonale 6: Chambrage pour vis à tête hexagonale M31 ×2
    with Locations(*[Vector(-0.457252483, 0, -0.889336925) * (i * CHAMBRAGE_POUR_VIS_T_TE_HEXAGONALE_6_PITCH) for i in range(1, CHAMBRAGE_POUR_VIS_T_TE_HEXAGONALE_6_COUNT)]):
        add(chambrage_pour_vis_t_te_hexagonale_m31, mode=Mode.SUBTRACT)


solid = part.part
